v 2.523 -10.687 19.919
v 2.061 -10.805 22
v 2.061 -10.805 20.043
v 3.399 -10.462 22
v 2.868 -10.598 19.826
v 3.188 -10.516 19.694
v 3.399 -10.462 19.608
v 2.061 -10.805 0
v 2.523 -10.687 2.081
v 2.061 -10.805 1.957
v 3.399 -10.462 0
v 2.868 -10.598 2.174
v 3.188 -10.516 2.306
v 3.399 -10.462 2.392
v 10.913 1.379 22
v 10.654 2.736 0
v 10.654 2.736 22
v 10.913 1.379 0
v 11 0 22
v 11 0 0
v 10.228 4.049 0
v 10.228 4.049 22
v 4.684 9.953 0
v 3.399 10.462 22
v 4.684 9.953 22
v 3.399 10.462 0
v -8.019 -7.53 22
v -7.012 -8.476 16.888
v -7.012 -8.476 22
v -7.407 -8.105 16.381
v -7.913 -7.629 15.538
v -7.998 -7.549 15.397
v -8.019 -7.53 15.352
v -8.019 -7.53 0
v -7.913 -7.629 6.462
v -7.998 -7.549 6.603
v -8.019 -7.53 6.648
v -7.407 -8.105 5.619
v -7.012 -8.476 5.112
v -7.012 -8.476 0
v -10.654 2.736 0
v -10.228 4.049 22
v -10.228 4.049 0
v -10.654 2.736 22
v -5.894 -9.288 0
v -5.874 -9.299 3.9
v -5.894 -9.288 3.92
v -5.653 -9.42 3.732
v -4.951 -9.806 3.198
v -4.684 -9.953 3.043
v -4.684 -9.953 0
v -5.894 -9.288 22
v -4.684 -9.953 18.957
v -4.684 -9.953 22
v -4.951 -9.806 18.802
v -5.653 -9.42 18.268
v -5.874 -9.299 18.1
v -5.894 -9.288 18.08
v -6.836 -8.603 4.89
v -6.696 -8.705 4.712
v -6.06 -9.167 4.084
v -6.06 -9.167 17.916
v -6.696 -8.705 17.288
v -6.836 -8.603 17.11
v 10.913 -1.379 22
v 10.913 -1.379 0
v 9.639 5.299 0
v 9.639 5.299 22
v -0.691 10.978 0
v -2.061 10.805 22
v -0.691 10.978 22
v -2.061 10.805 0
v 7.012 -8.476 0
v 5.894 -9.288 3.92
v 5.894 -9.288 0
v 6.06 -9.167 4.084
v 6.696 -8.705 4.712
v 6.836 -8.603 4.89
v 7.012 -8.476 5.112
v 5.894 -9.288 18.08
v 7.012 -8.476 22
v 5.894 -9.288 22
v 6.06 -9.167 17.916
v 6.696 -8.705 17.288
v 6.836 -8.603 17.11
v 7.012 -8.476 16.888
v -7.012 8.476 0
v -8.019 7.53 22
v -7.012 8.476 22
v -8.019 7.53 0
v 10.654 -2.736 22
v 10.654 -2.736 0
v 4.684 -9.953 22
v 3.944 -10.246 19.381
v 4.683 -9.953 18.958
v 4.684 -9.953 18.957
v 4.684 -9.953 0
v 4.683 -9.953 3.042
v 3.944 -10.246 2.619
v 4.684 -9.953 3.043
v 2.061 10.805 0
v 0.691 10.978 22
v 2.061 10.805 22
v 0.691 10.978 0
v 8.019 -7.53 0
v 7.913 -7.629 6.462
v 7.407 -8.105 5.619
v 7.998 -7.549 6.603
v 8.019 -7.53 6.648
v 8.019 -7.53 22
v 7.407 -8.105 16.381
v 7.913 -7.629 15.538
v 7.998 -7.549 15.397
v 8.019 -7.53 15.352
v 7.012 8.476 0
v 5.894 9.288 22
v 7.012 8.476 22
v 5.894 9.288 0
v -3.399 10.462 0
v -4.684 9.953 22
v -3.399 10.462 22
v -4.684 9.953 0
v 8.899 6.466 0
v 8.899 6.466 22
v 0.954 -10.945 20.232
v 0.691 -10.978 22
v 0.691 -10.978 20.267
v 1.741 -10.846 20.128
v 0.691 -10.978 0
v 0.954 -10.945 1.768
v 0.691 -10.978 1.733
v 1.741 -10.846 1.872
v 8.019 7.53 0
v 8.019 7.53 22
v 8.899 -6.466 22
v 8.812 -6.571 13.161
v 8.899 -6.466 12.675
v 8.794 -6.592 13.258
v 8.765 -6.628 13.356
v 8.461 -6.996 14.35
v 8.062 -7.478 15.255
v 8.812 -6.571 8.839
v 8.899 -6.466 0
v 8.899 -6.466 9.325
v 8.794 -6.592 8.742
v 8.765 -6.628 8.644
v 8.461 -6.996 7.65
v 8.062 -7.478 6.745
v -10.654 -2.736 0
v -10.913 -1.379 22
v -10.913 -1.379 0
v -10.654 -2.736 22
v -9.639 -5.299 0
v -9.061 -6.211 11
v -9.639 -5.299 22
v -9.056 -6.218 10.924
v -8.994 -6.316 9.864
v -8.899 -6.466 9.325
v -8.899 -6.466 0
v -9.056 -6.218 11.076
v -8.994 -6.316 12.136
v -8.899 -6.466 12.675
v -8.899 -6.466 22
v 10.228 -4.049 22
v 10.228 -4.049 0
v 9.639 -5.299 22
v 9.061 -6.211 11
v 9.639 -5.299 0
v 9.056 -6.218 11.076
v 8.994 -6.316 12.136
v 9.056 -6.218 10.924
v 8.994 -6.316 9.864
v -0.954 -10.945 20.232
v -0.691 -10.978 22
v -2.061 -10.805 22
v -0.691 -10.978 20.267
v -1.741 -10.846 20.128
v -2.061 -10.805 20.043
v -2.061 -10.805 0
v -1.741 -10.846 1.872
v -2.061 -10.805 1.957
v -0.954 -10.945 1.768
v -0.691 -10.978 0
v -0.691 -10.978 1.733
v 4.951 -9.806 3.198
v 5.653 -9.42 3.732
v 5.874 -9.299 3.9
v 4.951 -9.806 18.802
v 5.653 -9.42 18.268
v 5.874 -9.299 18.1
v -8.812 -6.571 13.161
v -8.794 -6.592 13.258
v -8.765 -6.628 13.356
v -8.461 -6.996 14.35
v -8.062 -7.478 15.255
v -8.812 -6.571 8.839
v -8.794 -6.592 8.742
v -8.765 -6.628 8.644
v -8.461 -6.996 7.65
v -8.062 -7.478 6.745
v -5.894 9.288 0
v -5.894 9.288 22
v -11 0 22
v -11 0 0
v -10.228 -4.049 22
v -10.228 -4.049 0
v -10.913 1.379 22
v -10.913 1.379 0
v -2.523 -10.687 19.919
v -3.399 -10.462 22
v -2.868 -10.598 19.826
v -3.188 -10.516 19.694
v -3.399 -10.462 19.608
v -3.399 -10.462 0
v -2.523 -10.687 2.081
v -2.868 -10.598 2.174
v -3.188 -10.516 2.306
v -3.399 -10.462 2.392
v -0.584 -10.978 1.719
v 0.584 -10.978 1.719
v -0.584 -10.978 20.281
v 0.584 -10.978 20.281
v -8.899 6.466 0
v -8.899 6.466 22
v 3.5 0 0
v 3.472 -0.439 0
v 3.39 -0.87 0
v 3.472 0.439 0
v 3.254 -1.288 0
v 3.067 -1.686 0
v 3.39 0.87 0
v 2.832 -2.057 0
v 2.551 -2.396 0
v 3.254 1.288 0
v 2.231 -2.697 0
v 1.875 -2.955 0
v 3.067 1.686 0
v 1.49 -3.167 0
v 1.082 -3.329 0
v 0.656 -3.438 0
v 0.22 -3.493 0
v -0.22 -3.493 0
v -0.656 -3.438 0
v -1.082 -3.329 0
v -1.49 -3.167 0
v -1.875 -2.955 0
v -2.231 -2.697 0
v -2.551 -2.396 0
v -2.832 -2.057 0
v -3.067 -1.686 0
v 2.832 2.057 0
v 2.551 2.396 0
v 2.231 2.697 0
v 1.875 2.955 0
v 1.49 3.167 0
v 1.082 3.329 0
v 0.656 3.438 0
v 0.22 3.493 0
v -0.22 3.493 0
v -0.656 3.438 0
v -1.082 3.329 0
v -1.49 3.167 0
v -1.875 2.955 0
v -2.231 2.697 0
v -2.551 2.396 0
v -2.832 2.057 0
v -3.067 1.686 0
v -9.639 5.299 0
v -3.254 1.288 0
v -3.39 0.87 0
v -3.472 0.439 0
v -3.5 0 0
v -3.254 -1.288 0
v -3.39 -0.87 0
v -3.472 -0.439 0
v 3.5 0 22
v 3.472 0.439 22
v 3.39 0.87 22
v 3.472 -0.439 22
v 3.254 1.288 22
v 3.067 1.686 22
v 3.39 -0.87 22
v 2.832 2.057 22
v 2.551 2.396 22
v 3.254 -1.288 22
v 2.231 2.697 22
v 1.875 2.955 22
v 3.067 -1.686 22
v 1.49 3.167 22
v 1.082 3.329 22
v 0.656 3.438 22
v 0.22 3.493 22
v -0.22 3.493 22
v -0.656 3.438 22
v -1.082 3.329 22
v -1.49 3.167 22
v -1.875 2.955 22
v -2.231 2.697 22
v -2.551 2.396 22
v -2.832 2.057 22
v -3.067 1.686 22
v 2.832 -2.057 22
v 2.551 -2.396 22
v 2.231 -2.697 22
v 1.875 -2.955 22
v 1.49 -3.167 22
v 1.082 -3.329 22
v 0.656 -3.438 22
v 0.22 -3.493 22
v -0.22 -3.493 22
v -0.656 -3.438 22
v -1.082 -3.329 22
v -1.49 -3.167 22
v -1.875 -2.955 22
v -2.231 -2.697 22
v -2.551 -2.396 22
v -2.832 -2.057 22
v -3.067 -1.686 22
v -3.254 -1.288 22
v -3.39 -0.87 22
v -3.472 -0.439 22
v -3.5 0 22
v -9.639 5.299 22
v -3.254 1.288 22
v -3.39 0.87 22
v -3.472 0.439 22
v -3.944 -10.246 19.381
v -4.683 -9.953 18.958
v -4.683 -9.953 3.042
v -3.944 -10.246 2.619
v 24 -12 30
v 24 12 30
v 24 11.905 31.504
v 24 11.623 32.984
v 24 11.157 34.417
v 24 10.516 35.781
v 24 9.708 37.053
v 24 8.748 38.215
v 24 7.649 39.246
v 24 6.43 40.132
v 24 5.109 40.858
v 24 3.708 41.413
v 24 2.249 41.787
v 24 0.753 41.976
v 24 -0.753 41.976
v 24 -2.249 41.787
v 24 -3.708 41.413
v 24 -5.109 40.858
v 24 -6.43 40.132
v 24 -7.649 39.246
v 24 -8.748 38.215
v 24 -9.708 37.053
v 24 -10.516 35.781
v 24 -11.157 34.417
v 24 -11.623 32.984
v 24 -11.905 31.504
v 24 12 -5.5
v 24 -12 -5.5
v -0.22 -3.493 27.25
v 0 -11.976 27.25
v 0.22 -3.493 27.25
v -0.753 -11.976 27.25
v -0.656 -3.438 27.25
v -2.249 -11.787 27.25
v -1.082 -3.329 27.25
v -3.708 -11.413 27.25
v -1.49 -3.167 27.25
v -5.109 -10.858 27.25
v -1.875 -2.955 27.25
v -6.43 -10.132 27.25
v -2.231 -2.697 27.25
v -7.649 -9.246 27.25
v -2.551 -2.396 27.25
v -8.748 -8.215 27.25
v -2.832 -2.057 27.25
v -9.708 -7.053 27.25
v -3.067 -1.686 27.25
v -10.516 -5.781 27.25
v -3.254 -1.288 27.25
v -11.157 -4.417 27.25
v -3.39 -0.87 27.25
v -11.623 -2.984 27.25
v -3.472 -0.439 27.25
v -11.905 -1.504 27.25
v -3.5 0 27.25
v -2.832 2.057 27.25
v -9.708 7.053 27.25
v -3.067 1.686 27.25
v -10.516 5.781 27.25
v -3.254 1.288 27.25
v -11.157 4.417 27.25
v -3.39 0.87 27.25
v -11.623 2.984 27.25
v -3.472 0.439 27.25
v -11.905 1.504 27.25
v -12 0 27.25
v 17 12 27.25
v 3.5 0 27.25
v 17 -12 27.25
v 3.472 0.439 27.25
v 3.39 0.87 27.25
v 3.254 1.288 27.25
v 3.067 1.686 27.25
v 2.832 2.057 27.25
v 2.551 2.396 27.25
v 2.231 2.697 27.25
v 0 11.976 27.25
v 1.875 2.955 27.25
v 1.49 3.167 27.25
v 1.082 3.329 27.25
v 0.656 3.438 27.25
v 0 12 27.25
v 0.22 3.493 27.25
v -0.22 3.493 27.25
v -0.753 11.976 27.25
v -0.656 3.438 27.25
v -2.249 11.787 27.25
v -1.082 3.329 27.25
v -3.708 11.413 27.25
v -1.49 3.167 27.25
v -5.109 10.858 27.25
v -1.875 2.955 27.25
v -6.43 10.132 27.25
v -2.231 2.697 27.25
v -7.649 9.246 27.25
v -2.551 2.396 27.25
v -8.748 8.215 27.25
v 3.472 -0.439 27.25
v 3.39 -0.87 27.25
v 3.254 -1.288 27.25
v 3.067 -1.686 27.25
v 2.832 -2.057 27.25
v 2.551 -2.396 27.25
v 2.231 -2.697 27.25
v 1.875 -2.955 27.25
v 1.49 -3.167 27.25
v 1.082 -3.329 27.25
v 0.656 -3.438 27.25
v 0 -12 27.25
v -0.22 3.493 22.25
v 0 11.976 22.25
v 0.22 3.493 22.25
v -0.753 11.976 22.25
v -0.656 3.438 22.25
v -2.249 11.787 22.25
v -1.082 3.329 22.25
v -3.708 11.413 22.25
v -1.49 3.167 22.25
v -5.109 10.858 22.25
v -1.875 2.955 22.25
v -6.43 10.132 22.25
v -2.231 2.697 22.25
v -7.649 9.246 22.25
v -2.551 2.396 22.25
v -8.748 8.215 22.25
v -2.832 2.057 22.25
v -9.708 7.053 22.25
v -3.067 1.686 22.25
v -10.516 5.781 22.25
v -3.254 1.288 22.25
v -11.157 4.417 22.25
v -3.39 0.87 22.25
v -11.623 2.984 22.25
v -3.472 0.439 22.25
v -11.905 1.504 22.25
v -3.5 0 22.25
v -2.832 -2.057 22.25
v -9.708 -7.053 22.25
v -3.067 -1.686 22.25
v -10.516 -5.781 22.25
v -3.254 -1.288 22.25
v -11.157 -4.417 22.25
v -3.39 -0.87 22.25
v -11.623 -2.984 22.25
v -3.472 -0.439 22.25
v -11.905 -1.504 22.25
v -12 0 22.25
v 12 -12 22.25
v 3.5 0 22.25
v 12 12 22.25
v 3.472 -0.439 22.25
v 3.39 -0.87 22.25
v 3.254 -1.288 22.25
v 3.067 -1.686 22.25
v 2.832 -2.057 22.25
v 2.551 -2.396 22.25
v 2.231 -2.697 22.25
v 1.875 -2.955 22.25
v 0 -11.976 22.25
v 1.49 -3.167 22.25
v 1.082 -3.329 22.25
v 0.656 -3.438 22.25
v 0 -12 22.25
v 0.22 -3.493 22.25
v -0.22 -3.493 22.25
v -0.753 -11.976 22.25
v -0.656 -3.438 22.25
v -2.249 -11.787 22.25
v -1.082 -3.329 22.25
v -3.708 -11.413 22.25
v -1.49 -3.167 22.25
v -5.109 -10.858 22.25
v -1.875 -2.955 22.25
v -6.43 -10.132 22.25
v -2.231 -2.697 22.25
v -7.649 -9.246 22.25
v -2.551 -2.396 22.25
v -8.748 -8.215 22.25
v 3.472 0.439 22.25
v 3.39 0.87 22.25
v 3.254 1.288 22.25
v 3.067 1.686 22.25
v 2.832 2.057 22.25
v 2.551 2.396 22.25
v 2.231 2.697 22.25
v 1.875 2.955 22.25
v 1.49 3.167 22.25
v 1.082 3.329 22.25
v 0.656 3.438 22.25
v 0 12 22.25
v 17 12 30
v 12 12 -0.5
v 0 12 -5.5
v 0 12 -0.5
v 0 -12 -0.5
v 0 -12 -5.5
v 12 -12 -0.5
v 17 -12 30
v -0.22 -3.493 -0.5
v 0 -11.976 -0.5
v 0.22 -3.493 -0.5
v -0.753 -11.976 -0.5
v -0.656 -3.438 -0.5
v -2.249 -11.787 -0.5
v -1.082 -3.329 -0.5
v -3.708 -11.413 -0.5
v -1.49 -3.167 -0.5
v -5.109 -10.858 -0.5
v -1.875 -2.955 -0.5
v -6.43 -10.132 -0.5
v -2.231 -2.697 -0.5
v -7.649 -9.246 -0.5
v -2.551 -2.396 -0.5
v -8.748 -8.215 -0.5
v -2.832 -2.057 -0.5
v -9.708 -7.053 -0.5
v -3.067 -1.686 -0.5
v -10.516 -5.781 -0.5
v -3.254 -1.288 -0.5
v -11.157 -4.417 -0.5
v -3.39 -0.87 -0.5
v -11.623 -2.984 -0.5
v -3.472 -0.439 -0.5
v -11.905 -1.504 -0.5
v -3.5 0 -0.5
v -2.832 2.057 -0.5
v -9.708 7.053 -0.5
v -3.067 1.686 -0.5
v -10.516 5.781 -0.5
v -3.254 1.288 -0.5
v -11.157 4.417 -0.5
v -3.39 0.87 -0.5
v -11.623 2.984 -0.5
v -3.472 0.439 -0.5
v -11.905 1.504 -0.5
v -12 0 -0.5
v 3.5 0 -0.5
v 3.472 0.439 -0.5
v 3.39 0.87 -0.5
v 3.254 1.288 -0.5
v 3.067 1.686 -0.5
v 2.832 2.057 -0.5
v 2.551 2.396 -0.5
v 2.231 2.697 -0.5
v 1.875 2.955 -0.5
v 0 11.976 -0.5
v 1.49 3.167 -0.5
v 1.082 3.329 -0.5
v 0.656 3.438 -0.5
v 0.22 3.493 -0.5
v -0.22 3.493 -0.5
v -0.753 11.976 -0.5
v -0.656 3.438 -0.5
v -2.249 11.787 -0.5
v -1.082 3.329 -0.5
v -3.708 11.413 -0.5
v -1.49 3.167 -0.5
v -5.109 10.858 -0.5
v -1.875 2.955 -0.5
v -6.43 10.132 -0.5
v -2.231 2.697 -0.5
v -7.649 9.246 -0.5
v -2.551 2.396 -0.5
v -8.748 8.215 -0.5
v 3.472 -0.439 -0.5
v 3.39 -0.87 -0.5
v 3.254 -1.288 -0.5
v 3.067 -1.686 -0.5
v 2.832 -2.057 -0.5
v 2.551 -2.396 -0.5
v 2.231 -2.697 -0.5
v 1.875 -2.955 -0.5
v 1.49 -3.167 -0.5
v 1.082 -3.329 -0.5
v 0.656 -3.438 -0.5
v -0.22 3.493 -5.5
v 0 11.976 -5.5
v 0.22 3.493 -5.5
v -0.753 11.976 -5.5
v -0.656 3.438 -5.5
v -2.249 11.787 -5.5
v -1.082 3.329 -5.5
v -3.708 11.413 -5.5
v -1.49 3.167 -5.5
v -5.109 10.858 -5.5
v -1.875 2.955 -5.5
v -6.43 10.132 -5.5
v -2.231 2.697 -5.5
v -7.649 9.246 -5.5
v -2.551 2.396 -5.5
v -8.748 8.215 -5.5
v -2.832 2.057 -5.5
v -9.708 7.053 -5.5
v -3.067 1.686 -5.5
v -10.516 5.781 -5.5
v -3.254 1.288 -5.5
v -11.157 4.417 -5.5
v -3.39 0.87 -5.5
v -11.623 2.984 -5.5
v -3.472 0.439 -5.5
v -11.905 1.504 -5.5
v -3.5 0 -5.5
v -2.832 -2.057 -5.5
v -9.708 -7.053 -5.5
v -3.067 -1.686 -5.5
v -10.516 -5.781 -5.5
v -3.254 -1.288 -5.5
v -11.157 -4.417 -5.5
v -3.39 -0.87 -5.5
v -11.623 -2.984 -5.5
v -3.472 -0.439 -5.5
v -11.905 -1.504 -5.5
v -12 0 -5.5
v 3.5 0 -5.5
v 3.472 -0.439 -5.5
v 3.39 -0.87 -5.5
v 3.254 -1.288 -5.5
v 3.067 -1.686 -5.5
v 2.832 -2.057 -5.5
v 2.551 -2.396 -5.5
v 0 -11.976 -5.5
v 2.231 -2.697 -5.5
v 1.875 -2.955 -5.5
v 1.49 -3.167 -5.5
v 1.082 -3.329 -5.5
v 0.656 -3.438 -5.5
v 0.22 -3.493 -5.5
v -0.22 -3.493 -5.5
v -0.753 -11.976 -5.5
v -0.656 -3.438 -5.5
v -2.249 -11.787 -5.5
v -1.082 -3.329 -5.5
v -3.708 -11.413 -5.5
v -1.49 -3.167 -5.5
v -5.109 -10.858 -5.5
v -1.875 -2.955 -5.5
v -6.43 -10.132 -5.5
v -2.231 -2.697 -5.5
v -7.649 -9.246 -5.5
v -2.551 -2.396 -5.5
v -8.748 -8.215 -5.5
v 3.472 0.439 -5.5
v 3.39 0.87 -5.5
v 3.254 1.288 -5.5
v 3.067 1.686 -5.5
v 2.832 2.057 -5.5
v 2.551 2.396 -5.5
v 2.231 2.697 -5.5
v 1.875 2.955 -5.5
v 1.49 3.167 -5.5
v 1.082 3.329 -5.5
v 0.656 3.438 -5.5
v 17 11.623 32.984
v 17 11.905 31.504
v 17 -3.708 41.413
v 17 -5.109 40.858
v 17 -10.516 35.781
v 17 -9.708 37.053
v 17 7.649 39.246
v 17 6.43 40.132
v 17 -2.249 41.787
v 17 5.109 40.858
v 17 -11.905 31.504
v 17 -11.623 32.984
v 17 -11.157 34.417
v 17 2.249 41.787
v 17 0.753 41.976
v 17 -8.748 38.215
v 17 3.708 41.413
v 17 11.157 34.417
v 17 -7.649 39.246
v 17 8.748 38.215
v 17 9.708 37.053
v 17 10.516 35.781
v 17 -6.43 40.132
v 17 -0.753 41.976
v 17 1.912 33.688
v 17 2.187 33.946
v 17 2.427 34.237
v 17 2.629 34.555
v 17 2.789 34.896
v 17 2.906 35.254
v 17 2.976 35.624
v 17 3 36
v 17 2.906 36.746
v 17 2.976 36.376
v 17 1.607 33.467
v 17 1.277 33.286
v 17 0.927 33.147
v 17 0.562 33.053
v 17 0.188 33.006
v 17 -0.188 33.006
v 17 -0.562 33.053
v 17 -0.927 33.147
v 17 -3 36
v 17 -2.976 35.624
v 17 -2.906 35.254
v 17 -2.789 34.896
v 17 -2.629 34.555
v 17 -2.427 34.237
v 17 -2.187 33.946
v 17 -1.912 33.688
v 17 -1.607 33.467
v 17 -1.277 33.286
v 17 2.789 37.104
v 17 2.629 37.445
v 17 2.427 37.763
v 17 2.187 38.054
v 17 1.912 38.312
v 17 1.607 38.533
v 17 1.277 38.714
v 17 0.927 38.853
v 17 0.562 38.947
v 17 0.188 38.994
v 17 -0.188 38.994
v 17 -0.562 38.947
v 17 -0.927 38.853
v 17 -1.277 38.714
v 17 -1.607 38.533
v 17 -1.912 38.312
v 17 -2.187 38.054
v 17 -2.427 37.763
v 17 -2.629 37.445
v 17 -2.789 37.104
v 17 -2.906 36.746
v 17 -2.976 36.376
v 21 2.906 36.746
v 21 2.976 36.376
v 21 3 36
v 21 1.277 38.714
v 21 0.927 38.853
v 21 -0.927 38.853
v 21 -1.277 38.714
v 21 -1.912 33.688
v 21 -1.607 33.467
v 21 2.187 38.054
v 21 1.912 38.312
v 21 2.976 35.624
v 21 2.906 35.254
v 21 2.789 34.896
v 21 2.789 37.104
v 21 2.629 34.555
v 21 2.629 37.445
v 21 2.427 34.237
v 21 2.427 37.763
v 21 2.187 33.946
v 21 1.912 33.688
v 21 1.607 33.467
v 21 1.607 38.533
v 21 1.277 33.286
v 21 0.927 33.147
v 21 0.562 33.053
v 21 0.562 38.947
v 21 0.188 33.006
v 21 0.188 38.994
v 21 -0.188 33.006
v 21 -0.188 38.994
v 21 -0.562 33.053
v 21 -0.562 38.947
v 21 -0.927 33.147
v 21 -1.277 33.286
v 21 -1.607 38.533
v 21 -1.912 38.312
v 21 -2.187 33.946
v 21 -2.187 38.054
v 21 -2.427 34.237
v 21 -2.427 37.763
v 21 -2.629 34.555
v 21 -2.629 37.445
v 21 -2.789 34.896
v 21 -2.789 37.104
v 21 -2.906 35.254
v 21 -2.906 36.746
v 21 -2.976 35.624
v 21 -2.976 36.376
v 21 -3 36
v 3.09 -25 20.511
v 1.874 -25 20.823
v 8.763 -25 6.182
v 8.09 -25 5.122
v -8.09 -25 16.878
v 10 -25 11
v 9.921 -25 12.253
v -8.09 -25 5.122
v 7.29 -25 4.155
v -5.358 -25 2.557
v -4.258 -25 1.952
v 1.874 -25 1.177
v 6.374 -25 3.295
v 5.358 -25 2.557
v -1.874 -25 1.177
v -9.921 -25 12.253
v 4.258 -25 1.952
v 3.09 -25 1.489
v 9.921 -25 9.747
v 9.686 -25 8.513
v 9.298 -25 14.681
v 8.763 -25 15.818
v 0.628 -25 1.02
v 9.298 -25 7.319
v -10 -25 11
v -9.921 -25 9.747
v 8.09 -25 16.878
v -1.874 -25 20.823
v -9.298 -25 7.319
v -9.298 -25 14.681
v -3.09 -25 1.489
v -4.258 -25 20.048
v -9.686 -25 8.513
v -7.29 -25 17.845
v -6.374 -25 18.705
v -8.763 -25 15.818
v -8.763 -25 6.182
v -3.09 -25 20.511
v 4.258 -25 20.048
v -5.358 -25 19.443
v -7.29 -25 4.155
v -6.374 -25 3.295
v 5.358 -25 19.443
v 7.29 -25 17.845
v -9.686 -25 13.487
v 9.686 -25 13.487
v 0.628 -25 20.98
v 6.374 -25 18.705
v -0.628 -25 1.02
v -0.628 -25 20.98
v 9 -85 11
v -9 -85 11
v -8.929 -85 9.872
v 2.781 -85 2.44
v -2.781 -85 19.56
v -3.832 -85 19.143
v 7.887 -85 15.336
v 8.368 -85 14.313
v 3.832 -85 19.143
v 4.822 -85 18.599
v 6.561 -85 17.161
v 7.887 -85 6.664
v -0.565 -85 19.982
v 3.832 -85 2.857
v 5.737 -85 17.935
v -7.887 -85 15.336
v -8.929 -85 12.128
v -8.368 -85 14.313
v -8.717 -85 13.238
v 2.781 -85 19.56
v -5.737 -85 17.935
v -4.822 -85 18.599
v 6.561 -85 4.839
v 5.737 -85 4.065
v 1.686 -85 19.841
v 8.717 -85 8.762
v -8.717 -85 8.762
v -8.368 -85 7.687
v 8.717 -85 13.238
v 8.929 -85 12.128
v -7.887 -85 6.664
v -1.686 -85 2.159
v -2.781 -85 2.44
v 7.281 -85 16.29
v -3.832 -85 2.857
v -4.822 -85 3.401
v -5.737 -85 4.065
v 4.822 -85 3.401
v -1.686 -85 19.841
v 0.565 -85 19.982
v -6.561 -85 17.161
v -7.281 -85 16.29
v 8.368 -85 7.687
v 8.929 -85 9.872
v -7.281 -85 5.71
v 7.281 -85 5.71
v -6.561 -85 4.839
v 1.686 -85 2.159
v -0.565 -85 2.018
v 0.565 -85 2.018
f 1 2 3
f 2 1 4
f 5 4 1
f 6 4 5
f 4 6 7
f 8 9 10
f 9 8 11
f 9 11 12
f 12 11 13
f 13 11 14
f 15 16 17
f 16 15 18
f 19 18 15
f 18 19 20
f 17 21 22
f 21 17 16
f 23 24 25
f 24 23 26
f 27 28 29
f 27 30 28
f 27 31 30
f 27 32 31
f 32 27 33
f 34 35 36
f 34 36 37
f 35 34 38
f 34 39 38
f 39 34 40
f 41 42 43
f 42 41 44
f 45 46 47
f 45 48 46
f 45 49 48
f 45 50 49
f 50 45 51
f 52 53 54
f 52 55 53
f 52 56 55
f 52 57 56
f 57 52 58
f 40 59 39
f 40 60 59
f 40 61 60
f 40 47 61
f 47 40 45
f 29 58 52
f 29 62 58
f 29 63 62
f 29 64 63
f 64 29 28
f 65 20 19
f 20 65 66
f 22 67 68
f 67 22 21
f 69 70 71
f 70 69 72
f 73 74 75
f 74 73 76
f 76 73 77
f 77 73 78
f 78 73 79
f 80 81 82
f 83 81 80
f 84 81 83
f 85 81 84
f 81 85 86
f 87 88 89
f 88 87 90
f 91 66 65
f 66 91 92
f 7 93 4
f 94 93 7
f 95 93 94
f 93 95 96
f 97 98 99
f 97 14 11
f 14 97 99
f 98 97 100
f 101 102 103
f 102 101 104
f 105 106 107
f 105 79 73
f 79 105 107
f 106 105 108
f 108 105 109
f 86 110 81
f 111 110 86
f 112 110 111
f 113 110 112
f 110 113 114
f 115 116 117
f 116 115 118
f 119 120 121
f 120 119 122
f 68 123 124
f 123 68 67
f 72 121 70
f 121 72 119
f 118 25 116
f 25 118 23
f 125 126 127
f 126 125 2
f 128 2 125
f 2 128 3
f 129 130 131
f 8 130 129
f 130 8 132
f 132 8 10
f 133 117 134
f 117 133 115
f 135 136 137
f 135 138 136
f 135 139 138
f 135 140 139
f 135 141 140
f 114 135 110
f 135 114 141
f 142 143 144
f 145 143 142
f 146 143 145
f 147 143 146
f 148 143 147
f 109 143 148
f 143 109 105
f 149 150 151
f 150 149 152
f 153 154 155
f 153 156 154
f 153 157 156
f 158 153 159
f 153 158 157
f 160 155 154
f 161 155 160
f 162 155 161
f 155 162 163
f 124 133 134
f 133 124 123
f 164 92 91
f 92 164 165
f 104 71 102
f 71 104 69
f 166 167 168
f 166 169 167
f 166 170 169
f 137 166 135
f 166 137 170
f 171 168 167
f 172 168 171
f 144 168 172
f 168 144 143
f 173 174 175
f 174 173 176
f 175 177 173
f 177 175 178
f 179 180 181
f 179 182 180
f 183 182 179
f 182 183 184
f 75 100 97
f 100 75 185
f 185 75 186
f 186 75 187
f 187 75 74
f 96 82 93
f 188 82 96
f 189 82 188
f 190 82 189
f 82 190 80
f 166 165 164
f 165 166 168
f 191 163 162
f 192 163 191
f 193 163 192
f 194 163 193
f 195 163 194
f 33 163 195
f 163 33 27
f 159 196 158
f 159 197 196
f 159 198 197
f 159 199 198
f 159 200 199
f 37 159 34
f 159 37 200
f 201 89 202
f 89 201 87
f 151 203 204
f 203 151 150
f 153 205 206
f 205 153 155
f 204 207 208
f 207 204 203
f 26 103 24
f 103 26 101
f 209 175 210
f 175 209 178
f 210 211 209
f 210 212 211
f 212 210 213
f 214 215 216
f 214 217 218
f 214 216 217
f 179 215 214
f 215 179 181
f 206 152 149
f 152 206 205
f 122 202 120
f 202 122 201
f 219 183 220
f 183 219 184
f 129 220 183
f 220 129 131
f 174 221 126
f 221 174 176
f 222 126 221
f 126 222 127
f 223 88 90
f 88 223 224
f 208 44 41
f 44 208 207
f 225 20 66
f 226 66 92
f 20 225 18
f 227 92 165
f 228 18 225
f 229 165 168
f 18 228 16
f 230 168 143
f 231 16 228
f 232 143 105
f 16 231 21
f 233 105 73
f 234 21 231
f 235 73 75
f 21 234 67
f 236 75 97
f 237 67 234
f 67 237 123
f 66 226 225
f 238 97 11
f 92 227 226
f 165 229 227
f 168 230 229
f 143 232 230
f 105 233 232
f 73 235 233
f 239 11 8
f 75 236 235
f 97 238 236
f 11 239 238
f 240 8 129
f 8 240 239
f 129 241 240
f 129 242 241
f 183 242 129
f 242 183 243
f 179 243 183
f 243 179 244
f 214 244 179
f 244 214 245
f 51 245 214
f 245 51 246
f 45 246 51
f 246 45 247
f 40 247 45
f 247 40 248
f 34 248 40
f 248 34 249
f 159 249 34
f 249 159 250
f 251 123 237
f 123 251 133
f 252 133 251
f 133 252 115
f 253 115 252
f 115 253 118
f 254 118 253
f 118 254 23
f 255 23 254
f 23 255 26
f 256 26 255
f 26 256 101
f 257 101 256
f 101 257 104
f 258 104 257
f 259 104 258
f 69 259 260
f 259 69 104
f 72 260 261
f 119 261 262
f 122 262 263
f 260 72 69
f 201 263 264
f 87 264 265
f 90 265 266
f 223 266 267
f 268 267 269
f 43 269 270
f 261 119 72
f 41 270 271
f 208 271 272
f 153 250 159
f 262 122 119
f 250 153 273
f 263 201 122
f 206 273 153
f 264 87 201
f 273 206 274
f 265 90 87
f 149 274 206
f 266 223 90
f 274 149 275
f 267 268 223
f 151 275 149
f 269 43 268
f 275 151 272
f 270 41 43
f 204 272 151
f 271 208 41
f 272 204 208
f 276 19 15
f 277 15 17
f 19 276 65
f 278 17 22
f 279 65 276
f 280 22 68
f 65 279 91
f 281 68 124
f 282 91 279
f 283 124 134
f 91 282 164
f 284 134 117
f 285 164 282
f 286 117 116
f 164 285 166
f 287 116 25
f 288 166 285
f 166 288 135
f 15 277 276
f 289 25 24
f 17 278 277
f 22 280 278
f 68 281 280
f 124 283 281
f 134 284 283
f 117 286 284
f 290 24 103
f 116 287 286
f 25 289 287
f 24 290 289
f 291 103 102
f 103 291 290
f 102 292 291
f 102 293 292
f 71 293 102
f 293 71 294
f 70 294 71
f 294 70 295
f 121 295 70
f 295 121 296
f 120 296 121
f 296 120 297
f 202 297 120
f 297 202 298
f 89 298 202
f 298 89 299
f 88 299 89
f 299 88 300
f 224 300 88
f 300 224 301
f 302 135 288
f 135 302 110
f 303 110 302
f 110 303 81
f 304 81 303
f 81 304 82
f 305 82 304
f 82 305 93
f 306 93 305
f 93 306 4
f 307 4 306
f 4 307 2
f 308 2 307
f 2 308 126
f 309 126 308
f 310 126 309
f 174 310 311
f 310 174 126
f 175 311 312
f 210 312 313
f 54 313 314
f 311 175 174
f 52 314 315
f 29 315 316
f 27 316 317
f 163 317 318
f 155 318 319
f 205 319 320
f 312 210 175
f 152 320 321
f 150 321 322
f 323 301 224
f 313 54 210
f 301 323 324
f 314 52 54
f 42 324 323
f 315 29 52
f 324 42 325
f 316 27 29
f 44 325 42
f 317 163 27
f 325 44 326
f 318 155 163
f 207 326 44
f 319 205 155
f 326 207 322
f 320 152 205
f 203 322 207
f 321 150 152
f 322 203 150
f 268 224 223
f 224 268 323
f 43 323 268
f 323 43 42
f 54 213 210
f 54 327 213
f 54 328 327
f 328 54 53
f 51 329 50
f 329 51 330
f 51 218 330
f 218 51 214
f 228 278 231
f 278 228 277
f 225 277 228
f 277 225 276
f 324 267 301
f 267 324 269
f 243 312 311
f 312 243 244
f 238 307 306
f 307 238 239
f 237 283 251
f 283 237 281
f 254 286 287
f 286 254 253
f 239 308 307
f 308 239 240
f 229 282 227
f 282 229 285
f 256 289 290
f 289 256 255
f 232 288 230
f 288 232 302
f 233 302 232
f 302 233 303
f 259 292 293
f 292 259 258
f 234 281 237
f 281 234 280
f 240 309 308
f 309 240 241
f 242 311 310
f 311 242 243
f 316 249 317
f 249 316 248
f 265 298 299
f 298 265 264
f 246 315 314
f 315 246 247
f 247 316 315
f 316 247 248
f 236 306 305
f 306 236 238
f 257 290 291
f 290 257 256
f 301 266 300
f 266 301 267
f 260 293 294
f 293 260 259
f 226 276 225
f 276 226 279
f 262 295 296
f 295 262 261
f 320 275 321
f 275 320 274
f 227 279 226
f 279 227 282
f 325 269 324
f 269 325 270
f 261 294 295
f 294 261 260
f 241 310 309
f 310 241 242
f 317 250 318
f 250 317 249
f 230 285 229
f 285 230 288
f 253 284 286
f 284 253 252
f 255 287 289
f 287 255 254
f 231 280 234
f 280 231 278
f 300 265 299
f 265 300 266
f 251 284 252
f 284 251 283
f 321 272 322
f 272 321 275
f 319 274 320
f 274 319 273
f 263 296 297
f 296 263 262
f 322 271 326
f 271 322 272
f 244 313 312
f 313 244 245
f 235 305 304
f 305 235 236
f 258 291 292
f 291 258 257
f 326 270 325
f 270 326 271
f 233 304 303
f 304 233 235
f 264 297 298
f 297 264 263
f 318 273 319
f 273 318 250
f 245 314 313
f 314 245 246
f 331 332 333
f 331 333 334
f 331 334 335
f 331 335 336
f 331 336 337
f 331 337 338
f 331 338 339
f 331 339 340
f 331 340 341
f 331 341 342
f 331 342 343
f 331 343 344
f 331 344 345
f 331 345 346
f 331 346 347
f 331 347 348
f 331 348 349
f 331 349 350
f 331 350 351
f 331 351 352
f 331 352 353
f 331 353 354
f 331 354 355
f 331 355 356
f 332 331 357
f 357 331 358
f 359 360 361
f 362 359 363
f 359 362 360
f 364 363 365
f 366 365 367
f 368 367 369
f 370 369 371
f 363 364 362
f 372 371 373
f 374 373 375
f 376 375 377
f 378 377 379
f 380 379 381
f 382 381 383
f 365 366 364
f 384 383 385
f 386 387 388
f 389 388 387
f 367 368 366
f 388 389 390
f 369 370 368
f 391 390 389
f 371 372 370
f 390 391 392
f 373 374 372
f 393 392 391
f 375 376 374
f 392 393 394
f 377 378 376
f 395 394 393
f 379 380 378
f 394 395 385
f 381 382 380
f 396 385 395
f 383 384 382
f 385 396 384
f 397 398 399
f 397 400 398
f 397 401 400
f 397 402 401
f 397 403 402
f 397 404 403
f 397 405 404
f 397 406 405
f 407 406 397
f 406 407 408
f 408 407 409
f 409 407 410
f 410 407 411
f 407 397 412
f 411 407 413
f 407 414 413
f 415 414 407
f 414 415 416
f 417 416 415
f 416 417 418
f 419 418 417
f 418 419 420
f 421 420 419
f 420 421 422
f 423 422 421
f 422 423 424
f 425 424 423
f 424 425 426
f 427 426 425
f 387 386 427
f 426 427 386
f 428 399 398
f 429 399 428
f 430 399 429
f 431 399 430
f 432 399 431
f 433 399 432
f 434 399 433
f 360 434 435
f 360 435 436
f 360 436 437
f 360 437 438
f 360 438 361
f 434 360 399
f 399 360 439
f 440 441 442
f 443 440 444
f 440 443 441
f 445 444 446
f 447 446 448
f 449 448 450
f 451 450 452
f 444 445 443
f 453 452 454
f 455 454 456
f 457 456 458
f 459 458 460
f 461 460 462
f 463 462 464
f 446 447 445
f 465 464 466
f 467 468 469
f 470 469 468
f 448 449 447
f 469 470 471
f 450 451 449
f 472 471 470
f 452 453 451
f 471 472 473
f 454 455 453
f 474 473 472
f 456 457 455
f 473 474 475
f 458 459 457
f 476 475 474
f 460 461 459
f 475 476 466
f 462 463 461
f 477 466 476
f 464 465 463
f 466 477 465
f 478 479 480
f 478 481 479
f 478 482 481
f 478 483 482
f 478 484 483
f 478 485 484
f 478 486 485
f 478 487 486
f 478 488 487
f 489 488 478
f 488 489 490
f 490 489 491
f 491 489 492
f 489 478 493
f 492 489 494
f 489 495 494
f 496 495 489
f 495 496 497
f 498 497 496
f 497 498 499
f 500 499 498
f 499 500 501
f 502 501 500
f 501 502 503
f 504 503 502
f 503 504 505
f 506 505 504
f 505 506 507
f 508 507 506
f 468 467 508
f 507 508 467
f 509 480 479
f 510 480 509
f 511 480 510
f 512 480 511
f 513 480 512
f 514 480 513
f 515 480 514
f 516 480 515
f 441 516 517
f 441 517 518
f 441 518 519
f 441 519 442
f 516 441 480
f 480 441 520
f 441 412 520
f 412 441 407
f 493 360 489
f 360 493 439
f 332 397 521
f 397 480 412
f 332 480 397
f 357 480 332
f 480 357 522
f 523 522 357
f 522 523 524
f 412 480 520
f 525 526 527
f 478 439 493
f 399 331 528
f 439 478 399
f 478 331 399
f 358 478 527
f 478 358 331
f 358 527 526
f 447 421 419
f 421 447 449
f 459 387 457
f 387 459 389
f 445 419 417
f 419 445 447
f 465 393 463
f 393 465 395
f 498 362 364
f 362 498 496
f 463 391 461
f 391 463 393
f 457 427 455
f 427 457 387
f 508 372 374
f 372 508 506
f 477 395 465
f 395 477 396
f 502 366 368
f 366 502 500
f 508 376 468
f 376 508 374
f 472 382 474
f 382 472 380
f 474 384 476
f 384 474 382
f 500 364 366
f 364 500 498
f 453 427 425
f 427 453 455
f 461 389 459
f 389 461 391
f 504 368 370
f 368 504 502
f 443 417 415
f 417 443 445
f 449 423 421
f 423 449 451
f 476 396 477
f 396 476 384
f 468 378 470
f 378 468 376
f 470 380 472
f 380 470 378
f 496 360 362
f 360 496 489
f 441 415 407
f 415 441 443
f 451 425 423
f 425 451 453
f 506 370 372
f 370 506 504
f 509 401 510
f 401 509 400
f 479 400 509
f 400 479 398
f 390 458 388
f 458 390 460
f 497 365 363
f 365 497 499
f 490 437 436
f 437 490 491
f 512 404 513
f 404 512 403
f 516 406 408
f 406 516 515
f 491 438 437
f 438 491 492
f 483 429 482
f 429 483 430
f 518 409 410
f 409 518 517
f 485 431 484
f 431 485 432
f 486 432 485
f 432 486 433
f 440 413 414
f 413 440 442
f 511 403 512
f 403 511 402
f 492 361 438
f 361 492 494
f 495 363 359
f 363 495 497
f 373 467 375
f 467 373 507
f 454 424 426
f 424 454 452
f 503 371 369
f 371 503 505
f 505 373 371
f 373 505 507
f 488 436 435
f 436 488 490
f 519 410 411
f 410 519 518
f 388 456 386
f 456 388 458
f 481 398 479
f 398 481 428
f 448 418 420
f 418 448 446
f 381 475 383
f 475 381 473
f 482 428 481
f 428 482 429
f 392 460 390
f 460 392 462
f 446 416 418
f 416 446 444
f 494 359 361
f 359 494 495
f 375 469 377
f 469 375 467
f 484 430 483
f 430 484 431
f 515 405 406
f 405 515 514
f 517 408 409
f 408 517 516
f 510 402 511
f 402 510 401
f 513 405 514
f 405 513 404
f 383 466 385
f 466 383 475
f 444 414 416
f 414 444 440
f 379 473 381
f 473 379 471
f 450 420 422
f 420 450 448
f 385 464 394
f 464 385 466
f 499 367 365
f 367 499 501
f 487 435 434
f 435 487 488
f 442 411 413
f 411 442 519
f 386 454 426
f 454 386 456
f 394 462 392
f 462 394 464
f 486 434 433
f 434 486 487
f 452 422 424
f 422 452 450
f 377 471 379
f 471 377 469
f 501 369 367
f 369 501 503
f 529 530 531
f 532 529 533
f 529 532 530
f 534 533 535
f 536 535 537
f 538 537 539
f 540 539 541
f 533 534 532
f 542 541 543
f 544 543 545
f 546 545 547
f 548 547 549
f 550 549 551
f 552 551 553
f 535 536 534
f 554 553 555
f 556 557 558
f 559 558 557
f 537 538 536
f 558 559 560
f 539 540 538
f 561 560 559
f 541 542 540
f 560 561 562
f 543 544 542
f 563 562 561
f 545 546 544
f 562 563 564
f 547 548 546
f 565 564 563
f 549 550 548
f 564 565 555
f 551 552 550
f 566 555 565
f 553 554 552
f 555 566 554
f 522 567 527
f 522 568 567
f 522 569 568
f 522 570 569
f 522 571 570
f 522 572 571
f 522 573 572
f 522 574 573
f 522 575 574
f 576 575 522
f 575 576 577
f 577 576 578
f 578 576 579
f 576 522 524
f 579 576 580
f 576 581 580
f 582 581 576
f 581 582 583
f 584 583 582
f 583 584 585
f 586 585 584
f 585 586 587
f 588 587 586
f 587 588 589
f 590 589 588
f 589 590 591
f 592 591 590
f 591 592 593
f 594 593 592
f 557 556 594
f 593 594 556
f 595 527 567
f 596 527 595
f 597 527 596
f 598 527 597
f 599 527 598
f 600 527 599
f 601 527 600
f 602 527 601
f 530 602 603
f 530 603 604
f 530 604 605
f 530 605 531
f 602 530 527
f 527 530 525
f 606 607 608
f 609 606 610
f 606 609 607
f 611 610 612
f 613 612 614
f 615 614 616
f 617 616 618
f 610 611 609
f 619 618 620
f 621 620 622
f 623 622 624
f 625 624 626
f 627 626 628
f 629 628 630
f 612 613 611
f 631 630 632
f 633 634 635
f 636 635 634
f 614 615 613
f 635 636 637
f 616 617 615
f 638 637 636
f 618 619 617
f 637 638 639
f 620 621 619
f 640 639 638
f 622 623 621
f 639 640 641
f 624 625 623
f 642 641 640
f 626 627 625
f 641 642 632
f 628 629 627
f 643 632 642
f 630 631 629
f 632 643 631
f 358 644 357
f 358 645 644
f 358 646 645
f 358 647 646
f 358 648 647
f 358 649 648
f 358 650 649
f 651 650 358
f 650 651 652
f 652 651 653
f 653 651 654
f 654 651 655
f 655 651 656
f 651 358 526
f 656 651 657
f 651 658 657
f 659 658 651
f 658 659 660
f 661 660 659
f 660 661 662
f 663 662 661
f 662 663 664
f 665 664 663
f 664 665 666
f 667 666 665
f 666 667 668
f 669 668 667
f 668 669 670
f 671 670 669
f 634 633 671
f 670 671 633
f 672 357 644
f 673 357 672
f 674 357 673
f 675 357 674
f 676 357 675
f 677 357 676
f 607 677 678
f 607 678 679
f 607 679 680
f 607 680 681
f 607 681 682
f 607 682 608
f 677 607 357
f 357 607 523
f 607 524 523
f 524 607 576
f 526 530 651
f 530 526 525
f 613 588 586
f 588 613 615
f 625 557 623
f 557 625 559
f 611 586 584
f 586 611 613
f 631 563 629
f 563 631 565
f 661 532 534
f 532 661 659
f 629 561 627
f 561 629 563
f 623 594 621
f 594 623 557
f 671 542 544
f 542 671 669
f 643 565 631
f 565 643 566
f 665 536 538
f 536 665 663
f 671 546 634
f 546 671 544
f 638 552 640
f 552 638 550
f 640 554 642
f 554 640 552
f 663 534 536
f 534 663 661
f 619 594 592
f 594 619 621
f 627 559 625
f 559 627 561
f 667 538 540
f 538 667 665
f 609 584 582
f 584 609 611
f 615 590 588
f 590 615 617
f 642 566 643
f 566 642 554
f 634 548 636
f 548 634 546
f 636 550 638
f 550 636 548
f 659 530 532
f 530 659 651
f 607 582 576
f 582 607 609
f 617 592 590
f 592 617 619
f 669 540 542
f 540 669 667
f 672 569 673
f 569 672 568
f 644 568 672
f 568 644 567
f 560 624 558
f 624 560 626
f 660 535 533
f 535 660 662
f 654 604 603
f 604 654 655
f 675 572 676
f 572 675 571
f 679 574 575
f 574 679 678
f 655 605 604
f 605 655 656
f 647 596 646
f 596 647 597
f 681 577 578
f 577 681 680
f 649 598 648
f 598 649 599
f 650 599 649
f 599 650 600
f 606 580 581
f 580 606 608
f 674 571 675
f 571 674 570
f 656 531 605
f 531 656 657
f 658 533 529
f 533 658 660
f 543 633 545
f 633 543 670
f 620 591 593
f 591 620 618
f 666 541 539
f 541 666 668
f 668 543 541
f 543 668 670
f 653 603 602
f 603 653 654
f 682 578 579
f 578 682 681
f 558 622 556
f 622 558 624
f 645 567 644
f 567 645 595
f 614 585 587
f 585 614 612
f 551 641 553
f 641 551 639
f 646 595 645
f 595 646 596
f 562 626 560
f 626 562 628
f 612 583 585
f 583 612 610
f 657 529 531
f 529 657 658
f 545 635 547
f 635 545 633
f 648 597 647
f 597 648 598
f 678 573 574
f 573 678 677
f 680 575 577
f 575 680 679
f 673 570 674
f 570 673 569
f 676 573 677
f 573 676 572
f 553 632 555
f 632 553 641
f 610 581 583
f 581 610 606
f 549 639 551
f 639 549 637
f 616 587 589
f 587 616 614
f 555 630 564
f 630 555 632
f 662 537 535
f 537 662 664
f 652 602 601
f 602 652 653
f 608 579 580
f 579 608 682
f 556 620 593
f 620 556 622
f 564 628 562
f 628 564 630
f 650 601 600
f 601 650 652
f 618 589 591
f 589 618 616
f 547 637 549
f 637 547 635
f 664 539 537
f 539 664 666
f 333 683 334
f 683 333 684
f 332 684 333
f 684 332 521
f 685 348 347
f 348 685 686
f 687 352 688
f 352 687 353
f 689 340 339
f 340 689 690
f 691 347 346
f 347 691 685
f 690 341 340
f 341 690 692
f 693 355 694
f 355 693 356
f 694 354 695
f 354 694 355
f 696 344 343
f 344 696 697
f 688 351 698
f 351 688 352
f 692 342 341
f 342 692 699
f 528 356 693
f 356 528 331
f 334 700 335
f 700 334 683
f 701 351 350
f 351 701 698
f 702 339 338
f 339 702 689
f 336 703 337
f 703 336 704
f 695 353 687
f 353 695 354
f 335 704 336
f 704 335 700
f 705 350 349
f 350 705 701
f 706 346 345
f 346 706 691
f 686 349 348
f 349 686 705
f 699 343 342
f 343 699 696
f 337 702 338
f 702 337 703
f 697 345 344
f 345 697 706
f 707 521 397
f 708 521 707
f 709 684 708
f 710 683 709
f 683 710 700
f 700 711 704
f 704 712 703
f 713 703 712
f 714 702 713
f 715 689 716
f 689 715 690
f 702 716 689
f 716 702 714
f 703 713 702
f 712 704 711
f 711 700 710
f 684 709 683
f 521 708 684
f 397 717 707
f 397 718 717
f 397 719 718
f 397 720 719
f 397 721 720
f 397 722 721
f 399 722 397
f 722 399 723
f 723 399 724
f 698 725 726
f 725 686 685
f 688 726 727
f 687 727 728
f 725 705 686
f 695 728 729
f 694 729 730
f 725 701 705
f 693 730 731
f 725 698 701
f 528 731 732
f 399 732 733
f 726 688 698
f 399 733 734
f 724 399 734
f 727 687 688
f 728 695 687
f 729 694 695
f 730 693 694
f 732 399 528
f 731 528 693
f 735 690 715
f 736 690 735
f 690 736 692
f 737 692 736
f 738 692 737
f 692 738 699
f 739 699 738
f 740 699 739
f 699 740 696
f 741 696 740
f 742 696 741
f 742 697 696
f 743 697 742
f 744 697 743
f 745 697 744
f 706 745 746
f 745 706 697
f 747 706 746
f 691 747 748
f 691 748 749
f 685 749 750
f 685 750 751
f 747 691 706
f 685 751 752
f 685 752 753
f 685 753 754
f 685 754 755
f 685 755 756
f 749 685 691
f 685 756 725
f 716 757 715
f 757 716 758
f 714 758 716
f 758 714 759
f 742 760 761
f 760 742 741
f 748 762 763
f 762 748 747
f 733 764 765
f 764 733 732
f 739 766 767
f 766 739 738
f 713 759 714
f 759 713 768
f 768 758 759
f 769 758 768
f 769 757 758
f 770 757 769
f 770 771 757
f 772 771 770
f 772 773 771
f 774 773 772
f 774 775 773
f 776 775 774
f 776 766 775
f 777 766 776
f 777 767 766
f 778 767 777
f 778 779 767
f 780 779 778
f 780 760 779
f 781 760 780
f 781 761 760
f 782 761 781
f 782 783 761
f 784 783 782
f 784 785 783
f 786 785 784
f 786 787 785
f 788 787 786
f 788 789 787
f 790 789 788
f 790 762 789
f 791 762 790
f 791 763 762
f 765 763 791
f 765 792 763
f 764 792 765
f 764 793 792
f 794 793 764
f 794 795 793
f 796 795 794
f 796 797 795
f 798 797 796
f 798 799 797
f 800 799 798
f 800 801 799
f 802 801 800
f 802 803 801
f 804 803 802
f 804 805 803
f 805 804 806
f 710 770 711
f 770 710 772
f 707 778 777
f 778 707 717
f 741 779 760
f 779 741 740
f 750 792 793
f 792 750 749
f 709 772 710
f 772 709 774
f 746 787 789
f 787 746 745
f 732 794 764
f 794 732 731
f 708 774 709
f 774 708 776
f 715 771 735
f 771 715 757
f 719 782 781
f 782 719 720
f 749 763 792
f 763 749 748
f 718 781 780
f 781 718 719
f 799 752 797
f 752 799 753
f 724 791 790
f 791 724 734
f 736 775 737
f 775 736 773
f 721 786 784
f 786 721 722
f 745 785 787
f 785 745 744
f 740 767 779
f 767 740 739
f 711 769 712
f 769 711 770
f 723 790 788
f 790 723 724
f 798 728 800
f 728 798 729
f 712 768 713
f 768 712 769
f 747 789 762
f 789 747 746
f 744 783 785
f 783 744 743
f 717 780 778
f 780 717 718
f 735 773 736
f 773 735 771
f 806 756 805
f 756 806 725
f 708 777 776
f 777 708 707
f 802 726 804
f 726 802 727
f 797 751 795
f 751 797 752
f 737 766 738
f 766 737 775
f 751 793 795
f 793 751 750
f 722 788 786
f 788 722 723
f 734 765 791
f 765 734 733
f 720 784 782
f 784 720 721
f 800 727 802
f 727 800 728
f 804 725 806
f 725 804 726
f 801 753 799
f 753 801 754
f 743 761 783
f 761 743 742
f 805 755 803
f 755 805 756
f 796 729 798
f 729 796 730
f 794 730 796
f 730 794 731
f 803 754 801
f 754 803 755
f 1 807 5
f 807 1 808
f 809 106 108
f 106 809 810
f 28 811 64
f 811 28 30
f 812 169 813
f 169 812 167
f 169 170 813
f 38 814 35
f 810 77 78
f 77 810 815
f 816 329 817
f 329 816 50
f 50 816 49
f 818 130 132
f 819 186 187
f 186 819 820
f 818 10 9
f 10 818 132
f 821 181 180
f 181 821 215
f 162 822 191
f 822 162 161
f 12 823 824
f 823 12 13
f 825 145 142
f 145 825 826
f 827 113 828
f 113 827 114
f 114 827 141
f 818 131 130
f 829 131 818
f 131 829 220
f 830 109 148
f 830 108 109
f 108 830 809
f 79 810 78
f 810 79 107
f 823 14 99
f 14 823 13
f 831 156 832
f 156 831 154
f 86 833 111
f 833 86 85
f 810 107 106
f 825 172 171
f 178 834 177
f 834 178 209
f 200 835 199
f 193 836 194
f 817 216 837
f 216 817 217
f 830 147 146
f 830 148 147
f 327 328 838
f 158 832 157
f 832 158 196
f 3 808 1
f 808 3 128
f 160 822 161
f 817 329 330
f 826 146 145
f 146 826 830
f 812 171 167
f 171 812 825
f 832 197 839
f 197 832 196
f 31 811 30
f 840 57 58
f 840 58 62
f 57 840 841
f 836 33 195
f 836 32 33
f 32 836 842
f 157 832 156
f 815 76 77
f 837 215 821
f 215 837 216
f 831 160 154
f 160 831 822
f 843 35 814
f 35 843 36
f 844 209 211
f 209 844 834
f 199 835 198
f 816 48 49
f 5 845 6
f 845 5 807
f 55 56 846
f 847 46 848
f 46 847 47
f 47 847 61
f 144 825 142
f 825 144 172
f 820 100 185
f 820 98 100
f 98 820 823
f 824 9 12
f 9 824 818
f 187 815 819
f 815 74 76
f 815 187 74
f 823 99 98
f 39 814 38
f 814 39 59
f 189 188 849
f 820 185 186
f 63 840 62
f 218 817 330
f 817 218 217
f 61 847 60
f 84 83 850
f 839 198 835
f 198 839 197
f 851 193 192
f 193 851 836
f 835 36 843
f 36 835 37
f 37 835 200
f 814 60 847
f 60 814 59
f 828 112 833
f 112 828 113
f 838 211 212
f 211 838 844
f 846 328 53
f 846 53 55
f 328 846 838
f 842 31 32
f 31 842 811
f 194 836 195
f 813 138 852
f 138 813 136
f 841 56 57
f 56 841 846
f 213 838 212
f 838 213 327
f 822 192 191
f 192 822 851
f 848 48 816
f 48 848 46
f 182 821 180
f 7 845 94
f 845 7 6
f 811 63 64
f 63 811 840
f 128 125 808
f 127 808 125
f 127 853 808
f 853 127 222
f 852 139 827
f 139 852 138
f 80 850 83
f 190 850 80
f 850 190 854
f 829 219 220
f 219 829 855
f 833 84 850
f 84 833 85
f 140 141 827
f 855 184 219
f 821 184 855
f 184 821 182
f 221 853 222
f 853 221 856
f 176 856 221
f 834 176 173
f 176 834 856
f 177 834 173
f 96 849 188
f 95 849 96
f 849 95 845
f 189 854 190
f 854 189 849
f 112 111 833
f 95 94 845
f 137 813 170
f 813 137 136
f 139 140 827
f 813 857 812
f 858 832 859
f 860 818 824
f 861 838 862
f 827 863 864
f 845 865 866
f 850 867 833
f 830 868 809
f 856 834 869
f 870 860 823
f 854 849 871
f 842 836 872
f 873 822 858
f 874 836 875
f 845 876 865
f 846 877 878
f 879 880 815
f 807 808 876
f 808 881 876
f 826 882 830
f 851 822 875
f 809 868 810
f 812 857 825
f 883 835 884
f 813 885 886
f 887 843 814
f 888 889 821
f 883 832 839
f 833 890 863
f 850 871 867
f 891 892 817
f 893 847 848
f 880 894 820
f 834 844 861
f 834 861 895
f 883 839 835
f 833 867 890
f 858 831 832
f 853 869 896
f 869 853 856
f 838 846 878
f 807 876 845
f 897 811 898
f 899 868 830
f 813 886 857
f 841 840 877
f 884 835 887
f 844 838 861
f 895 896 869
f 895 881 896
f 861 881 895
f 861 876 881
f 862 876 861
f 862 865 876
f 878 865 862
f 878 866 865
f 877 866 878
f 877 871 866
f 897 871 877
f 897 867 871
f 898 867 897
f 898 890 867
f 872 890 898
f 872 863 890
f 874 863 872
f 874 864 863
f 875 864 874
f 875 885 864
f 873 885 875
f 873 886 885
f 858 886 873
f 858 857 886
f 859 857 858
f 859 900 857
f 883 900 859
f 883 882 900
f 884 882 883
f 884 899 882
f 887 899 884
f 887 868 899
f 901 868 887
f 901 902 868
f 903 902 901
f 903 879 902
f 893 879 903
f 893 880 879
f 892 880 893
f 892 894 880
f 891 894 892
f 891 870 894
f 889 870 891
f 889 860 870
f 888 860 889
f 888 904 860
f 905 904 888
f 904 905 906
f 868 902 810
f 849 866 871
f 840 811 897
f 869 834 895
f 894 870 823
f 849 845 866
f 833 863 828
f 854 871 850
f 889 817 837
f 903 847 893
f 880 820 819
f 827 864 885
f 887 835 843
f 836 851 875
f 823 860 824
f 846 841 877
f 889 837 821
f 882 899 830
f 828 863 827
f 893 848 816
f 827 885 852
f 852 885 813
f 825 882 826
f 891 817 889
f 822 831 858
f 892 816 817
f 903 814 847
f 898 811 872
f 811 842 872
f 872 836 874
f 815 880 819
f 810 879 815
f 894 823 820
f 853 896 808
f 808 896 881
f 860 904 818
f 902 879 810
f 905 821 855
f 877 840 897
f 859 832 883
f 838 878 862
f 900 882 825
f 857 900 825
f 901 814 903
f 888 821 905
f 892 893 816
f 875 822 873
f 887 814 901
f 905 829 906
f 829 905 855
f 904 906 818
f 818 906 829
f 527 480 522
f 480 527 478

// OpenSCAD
// CSG.scad - Basic example of CSG usage

$fn=50;

//*********trailer deel***********
difference() { 
    cylinder(22,11,11);
    translate([0,0,-1])
    cylinder(24,3.5,3.5);   
};
translate([0,-5,11])
rotate([90,0,0])
cylinder(20,9,10);
translate([0,-25,11])
rotate([90,0,0])
cylinder(60,10,9);



//*********fiets deel***********

//boven ring
translate([-0,0,22.25])
difference() {
    union() {
        translate([0,-12,0])
        cube([24,24,5]);
        cylinder(5,12,12);
    }
    translate([0,0,-1])
    cylinder(35,3.5,3.5);   
}

//onder ring
translate([-0,0,-5.5])
difference() {
    union() {
        translate([0,-12,0])
        cube([24,24,5]);
        cylinder(5,12,12);
    }
    translate([0,0,-1])
    cylinder(35,3.5,3.5);   
}

//brug
translate([12,-12,-5.5])
cube([12,24,31]);
echo(version=version());

//snelkoppeling
translate([17,-12,25])
cube([7,24,5]);
translate([17,0,30])
rotate([90,0,90])
difference() {
    cylinder(7,12,12);
    translate([0,6,-1])
    cylinder(5,3,3);
}
